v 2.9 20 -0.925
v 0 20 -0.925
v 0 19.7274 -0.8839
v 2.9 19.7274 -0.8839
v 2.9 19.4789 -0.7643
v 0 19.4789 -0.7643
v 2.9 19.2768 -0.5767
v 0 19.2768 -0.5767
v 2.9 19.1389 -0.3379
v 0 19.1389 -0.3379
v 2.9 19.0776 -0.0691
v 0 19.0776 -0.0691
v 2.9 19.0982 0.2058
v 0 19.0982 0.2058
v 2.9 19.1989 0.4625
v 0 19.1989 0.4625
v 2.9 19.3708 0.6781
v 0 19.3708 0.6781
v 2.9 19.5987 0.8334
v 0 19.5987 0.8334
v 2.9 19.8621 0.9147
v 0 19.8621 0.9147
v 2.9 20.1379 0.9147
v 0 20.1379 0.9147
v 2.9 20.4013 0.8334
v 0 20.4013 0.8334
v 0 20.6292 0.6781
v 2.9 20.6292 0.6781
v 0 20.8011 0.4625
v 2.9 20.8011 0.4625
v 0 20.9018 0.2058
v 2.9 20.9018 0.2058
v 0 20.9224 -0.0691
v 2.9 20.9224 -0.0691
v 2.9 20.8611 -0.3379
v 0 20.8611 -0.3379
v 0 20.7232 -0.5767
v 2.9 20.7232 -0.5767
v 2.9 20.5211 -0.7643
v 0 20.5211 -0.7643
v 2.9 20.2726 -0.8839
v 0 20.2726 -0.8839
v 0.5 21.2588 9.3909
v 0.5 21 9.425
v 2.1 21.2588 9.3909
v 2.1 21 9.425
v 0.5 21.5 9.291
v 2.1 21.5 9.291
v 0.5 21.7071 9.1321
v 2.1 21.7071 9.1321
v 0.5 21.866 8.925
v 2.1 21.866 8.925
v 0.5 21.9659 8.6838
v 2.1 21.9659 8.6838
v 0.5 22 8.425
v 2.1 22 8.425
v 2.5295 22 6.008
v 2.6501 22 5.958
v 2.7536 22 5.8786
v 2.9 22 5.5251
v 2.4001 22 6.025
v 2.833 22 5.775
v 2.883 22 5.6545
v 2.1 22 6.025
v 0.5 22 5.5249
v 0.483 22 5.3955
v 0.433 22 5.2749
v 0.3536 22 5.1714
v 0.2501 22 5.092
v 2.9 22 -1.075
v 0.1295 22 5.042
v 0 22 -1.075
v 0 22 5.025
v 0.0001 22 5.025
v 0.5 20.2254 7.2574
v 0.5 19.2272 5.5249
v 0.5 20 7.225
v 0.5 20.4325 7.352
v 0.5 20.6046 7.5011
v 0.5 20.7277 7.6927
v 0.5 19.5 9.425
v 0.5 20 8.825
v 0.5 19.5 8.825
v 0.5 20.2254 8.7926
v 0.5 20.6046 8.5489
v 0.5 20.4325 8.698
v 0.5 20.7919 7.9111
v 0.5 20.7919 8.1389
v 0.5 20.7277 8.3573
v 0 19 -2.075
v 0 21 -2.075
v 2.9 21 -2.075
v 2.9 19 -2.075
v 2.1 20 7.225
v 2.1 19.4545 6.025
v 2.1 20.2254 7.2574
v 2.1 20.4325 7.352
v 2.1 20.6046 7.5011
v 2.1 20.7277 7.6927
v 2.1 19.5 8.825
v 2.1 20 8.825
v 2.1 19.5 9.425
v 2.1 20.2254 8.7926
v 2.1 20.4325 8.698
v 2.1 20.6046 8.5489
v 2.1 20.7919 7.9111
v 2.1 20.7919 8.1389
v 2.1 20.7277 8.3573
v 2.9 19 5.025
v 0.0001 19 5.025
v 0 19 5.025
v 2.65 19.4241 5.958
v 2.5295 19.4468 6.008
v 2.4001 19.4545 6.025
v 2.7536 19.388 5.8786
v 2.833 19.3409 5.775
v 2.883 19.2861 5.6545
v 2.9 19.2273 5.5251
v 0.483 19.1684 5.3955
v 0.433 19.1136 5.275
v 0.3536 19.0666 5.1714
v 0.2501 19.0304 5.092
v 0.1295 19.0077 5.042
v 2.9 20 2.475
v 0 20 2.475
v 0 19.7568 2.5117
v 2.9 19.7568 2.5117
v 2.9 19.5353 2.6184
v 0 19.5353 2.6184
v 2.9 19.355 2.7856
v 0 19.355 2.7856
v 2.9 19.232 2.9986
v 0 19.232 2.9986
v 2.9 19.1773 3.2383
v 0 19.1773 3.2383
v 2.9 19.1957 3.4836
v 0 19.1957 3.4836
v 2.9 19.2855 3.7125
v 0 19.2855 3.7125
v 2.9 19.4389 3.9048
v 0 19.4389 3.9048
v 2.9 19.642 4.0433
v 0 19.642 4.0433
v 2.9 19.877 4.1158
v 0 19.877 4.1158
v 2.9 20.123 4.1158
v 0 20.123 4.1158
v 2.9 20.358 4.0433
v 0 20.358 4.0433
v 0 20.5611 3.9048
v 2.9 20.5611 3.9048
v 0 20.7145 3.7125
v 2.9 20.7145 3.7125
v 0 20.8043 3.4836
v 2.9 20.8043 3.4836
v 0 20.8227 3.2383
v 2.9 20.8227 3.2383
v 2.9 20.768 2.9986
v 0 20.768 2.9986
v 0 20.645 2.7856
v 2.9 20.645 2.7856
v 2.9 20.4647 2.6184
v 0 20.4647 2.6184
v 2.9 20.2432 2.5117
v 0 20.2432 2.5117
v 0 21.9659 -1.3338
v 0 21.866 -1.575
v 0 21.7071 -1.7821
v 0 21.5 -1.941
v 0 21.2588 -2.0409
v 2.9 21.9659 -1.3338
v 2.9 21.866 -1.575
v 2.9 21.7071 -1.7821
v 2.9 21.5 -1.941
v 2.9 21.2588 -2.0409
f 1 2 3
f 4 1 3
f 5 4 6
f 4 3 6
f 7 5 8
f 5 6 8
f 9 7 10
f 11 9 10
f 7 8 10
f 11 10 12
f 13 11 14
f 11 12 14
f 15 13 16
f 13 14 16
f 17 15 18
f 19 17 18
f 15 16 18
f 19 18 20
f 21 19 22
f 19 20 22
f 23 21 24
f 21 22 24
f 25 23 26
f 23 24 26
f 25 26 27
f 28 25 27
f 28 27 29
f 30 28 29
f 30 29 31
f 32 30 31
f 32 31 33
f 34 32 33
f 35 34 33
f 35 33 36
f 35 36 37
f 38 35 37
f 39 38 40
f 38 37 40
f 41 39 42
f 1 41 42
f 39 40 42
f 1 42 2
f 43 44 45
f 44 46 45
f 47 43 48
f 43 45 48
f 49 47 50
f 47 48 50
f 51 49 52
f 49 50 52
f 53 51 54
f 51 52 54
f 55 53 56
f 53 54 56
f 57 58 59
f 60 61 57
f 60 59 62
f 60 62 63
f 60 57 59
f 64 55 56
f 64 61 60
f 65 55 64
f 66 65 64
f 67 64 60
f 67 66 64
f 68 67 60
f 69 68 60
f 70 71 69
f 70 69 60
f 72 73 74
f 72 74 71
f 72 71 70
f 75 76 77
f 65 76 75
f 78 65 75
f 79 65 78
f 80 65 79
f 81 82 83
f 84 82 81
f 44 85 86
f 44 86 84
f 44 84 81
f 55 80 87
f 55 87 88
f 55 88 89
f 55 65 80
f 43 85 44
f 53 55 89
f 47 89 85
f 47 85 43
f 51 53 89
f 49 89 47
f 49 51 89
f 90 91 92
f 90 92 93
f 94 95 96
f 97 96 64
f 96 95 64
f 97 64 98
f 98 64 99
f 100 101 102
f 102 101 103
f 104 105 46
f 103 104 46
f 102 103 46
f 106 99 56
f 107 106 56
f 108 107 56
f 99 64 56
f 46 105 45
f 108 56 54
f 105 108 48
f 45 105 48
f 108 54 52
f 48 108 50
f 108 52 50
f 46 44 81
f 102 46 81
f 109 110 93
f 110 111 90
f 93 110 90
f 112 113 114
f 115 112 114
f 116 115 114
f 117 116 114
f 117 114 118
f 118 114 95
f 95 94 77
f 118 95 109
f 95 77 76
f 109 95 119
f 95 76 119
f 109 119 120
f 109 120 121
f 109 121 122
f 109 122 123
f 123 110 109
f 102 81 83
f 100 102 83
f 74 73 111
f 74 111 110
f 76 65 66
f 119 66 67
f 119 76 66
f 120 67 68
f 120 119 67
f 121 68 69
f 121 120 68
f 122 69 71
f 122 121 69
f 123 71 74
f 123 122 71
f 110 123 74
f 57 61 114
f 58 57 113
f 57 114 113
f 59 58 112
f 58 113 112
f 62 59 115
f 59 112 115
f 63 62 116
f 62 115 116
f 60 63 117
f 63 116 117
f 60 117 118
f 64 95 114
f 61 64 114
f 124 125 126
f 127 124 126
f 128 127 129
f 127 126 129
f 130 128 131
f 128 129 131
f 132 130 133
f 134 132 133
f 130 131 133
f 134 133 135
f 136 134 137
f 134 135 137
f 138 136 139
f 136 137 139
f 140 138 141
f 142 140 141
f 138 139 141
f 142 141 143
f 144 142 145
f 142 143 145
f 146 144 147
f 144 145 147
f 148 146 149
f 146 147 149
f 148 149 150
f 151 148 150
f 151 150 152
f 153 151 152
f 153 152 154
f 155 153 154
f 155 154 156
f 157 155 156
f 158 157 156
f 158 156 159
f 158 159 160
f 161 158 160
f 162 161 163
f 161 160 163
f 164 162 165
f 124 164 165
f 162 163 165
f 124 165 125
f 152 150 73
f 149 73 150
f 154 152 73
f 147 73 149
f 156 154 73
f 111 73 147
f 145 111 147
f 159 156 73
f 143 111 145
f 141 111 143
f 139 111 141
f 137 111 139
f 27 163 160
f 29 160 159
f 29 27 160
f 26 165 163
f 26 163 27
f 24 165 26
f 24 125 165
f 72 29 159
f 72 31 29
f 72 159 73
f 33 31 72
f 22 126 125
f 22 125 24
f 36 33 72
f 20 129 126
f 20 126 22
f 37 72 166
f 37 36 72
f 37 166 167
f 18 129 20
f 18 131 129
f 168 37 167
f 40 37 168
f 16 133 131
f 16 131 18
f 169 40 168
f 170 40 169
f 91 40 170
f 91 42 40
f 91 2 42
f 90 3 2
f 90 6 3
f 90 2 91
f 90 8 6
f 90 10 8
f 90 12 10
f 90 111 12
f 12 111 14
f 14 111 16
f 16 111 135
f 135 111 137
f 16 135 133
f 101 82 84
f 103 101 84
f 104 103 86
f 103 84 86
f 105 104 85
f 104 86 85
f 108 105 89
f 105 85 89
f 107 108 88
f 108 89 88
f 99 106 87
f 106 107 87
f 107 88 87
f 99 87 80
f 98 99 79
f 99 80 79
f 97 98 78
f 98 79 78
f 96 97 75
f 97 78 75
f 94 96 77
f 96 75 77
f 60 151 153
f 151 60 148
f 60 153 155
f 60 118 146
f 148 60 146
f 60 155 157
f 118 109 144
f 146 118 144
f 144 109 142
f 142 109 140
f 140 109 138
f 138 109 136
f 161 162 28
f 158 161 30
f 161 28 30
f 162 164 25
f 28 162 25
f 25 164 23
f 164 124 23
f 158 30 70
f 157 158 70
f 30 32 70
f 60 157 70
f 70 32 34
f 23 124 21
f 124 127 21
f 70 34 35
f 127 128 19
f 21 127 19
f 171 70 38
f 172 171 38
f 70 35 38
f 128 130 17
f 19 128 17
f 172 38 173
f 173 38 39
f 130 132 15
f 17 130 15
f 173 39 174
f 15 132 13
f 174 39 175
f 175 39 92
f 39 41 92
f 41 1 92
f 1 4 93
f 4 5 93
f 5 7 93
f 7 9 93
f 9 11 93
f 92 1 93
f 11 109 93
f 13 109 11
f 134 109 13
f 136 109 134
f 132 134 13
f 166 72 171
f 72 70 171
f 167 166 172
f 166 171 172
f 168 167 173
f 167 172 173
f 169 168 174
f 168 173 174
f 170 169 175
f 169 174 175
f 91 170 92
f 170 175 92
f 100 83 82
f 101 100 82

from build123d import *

# Parameters (mm, degrees)
SKETCH_1_W          = 11.5
SKETCH_1_H          = 3
SKETCH_1_R          = 0.925
SKETCH_1_R_2        = 0.825
SKETCH_1_R_3        = 0.8
EXTRUDE_1_DEPTH     = 2.9
CUT_EXTRUDE_1_DEPTH = 11.06184004
SKETCH_2_W          = 0.5
SKETCH_2_H          = 4.4
SKETCH_2_W_2        = 0.8
SKETCH_2_H_2        = 3.4
CUT_EXTRUDE_2_DEPTH = 11.3073093
FILLET_2_R          = 1
FILLET_3_R          = 0.5
SKETCH_3_W          = 47.443490455
SKETCH_3_H          = 29.152776371
CUT_EXTRUDE_3_DEPTH = 16.531922772


with BuildPart() as part:
    # 草图1 → 凸台-拉伸1 (new body)
    with BuildSketch(Plane(origin=(0, 0, 0), x_dir=(0, 0, -1), z_dir=(1, 0, 0))):
        with Locations((-3.675, -0.5)):
            Rectangle(SKETCH_1_W, SKETCH_1_H)
        Circle(SKETCH_1_R, mode=Mode.SUBTRACT)
        with Locations((-3.3, 0)):
            Circle(SKETCH_1_R_2, mode=Mode.SUBTRACT)
        with Locations((-8.025, 0)):
            Circle(SKETCH_1_R_3, mode=Mode.SUBTRACT)
    extrude(amount=EXTRUDE_1_DEPTH)

    # 草图1<11> → 切除-拉伸1 (cut, through all)
    with BuildSketch(Plane(origin=(0, 0, 0), x_dir=(0, 0, -1), z_dir=(1, 0, 0))):
        with BuildLine():
            Line((-8.825, 0.5), (-8.825, 0))
            ThreePointArc((-8.825, 0), (-8.025, 0.8), (-7.225, 0))
            Line((-7.225, 0), (-5.025, 1))
            Line((-5.025, 1), (-9.425, 1))
            Line((-9.425, 1), (-9.425, 0.5))
            Line((-9.425, 0.5), (-8.825, 0.5))
        make_face()
    extrude(amount=CUT_EXTRUDE_1_DEPTH, mode=Mode.SUBTRACT)

    # 草图2 → 切除-拉伸2 (cut, through all)
    with BuildSketch(Plane.XZ.offset(2)):
        with Locations((0.25, 7.225)):
            Rectangle(SKETCH_2_W, SKETCH_2_H)
        with Locations((2.5, 7.725)):
            Rectangle(SKETCH_2_W_2, SKETCH_2_H_2)
    extrude(amount=-CUT_EXTRUDE_2_DEPTH, mode=Mode.SUBTRACT)

    # 圆角2
    fillet_2_edges = [part.edges().sort_by_distance(p)[0] for p in [
        (1.45, -2, -2.075),
        (1.3, -2, 9.425),
    ]]
    fillet(fillet_2_edges, radius=FILLET_2_R)

    # 圆角3
    fillet_3_edges = [part.edges().sort_by_distance(p)[0] for p in [
        (2.9, -0.727272727, 6.025),
        (0.5, -0.5, 5.025),
    ]]
    fillet(fillet_3_edges, radius=FILLET_3_R - 0.0001)  # a hair under: the kernel refuses the full size


with BuildPart() as body_2:
    # 镜向1: mirrored copy
    add(part.part.mirror(Plane.ZX.offset(10)))


with BuildPart() as part_1:
    add(part.part)

    # 草图3 → 切除-拉伸3 (cut, through all)
    with BuildSketch(Plane(origin=(0, 10, 0), x_dir=(1, 0, 0), z_dir=(0, 1, 0))):
        with Locations((5.281098752, -2.215269705)):
            Rectangle(SKETCH_3_W, SKETCH_3_H)
    extrude(amount=-CUT_EXTRUDE_3_DEPTH, mode=Mode.SUBTRACT)


solid = body_2.part
